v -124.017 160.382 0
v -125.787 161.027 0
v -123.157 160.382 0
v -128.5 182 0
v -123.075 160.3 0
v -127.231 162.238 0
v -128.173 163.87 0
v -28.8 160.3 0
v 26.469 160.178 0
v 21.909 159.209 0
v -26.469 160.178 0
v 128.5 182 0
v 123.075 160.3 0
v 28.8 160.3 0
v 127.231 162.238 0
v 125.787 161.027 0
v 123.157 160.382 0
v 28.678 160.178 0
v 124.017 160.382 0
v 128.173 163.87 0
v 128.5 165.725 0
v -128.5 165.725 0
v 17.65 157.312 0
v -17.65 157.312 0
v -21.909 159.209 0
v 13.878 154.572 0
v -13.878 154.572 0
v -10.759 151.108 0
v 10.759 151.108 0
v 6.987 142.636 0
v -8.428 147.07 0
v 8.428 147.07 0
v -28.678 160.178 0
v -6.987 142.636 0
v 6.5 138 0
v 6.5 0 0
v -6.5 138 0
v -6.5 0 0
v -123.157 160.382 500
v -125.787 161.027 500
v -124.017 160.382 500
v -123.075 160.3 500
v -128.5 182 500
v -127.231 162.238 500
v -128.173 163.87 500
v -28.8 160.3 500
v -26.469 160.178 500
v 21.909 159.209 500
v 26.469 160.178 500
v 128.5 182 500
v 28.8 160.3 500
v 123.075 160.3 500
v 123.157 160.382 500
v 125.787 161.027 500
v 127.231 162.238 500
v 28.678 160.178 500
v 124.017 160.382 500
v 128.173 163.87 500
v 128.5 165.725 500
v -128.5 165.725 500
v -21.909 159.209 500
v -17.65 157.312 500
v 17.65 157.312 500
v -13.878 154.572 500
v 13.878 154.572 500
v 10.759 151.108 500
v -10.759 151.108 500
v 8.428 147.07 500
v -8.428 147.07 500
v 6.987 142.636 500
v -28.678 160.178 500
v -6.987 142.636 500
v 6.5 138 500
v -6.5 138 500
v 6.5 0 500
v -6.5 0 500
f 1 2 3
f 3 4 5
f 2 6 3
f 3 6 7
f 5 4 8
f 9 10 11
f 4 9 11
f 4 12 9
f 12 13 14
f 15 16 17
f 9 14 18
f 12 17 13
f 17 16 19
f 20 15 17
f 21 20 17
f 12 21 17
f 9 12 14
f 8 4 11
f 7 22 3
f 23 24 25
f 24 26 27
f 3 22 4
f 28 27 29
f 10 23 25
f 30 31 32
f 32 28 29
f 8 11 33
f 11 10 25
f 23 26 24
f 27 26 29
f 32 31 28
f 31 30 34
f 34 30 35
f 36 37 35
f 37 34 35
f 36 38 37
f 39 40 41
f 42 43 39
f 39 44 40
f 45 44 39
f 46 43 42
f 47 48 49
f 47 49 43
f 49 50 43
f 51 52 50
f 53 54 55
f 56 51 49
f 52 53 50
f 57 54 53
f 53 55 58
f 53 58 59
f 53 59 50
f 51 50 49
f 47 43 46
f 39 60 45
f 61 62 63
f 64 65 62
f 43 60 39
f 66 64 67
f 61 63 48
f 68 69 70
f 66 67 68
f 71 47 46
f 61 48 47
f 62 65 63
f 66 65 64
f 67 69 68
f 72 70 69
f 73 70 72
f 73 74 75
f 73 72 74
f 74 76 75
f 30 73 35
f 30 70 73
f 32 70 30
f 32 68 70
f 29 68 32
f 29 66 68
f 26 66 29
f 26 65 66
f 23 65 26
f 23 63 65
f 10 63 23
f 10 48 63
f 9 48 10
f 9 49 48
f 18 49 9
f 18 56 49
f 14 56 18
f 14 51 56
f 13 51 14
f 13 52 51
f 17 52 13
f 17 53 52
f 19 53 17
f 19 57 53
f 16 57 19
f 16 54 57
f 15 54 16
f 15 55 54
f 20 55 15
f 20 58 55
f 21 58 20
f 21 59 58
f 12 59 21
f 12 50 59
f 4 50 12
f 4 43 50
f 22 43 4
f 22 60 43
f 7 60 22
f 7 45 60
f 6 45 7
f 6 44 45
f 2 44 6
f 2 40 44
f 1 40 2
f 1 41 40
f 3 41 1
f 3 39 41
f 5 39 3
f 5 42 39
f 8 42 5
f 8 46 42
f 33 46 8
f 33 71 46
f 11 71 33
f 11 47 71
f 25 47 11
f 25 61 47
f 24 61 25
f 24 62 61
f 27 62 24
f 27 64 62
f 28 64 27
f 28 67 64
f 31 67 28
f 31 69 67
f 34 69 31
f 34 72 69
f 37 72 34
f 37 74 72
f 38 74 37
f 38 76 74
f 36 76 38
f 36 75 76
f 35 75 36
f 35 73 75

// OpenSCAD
module WT(b,t,d,w,l=300,k=undef,r1=undef) {
    k = k==undef ? 2.1*t : k;  // the k distance is tabulated in the W tables
    r = k - t;     // radius of stem to flange fillet.
    r1 = r1==undef ? t/4 : r1;    // radius of fillet inside of flange tips
    pts = [[w/2,0],
                [w/2,d-t-r],
                [w/2+r,d-t],
                [b/2-r1,d-t],
                [b/2,d-t+r1],
                [b/2,d],
                [-b/2,d],
                [-b/2,d-t],
                [-b/2,d-t+r1],
                [-b/2+r1,d-t],
                [-w/2-r,d-t],
                [-w/2,d-t-r],
                [-w/2,0]];
    linear_extrude(height=l) {
        difference() {
            union() {
                polygon(pts);
                translate([b/2-r1,d-t+r1,0]) { circle(r=r1); }
                translate([-b/2+r1,d-t+r1,0]) { circle(r=r1); }
            }
            translate([w/2+r,d-t-r,0]) {circle(r=r);}
            translate([-w/2-r,d-t-r,0]) {circle(r=r);}
        }
    }
}

render()  {
    WT(257,21.7,182,13,k=44,l=500);  // WT180x61
}
